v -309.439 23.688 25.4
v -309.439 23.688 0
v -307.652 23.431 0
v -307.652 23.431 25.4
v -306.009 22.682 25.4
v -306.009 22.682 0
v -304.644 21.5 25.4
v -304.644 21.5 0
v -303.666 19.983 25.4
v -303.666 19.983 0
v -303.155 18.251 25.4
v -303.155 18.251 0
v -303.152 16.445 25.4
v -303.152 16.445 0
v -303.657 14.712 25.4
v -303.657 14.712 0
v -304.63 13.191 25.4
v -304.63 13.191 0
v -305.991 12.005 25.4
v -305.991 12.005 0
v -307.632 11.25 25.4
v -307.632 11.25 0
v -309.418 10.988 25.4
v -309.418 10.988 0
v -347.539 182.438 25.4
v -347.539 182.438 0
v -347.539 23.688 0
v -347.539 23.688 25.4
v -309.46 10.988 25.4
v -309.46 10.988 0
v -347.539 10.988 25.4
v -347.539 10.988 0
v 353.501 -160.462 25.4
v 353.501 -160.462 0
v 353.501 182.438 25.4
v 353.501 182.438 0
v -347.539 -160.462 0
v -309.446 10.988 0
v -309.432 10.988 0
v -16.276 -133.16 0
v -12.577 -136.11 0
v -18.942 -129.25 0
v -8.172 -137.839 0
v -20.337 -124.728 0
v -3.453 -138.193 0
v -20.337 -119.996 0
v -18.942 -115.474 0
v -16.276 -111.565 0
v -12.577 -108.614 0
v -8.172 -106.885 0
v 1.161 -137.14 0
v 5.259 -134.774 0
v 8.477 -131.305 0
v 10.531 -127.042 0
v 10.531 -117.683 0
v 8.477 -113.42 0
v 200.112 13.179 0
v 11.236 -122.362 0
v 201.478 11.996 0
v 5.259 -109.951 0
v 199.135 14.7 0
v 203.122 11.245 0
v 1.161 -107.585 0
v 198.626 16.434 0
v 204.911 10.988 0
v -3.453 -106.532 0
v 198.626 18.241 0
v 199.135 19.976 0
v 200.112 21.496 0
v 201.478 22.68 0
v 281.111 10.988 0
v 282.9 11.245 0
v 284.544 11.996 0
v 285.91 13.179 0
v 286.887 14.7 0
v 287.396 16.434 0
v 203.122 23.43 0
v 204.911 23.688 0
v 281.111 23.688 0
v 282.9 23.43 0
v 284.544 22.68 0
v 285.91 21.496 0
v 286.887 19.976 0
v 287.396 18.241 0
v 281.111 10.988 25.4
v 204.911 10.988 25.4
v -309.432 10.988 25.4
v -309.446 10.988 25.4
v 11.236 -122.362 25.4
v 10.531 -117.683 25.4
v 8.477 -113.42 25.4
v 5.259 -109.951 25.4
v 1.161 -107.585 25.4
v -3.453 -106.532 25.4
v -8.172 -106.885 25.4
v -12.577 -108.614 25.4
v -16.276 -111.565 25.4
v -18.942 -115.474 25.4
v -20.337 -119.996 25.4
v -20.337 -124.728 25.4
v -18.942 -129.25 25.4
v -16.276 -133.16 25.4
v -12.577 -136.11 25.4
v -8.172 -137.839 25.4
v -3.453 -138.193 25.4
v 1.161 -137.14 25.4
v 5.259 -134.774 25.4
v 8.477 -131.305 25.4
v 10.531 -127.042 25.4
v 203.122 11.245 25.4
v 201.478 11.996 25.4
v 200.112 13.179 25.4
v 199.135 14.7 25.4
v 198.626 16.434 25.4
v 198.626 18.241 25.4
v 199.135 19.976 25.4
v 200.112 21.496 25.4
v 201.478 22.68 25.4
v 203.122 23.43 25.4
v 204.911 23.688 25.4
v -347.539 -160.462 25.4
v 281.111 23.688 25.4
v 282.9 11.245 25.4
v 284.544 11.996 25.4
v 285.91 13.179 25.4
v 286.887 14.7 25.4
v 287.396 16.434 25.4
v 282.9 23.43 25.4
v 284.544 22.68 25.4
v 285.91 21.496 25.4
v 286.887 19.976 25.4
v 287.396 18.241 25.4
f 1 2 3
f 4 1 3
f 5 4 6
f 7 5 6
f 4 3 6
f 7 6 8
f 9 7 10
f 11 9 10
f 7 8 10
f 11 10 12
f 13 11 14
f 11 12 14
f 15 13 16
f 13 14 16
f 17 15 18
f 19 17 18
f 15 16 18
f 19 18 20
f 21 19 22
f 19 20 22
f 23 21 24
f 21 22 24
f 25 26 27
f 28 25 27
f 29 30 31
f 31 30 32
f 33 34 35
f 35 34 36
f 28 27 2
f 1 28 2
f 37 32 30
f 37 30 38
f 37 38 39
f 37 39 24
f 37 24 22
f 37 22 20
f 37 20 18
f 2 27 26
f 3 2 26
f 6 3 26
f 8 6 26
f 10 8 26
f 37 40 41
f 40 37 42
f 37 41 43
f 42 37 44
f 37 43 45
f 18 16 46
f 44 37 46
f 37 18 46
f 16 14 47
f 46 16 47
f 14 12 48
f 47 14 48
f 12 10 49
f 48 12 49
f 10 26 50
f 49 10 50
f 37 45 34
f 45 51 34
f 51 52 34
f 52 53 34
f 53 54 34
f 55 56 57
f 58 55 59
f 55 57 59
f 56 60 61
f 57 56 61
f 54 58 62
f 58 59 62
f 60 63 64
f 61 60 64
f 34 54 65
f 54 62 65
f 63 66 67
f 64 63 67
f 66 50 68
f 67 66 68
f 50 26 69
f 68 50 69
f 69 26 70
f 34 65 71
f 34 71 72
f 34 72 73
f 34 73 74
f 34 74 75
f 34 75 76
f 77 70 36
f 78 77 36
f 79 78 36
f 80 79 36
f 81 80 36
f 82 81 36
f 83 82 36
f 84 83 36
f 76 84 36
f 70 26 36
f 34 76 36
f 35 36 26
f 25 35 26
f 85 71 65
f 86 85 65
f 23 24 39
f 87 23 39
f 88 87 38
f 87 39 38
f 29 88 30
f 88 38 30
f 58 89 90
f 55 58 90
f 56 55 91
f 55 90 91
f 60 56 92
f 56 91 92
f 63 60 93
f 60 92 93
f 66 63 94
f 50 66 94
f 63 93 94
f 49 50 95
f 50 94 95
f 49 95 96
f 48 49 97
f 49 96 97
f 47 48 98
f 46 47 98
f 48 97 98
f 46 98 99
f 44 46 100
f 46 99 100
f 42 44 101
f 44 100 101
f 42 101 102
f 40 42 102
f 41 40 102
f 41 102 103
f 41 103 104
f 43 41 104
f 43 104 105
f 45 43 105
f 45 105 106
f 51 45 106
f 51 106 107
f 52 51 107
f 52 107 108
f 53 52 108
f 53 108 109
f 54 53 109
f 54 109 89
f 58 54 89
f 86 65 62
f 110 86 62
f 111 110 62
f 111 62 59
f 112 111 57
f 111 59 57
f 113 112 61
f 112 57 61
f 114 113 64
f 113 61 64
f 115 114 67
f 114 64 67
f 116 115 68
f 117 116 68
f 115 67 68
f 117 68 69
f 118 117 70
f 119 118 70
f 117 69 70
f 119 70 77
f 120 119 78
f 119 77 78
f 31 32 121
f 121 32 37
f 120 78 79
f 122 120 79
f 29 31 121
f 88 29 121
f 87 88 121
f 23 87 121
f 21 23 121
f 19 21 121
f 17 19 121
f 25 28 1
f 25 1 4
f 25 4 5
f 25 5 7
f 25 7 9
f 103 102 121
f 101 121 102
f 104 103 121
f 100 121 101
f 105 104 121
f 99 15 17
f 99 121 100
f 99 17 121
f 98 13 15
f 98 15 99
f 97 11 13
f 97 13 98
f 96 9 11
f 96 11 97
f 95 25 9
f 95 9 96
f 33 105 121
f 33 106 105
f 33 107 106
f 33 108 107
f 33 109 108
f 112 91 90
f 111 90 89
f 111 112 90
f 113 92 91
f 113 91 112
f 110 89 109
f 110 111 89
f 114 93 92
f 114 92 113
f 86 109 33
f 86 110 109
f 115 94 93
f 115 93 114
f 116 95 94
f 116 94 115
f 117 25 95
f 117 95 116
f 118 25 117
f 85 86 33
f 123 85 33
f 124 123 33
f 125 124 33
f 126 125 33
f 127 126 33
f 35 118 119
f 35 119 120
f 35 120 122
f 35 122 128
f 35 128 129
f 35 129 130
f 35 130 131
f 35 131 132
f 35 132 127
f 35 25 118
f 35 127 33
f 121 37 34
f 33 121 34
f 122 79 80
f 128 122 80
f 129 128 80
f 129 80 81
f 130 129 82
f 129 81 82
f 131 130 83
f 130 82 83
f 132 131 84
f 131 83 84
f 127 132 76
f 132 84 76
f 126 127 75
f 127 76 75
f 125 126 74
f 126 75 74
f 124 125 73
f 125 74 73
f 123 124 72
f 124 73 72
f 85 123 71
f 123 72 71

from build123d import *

# Parameters (mm, degrees)
F1_DEPTH = 25.4
F2_R     = 15.875
F3_DEPTH = 25.401


with BuildPart() as f1:
    # F0 (on Top) → F1 (new body)
    with BuildSketch(Plane.XY):
        with BuildLine():
            Line((353.500903, 182.437663), (-347.539097, 182.437663))
            Line((-347.539097, 182.437663), (-347.539097, 23.687663))
            Line((-347.539097, 23.687663), (-309.439097, 23.687663))
            ThreePointArc((-309.439097, 23.687663), (-303.089106, 17.348244), (-309.417936, 10.987698))
            ThreePointArc((-309.417936, 10.987698), (-309.439097, 10.987663), (-309.460259, 10.987698))
            Line((-309.460259, 10.987698), (-347.539097, 10.987698))
            Line((-347.539097, 10.987698), (-347.539097, -160.462337))
            Line((-347.539097, -160.462337), (353.500903, -160.462337))
            Line((353.500903, -160.462337), (353.500903, 182.437663))
        make_face()
        with BuildLine():
            ThreePointArc((204.910903, 10.987663), (198.560903, 17.337663), (204.910903, 23.687663))
            Line((204.910903, 23.687663), (281.110903, 23.687663))
            ThreePointArc((281.110903, 23.687663), (287.460903, 17.337663), (281.110903, 10.987663))
            Line((281.110903, 10.987663), (204.910903, 10.987663))
        make_face(mode=Mode.SUBTRACT)
    extrude(amount=F1_DEPTH)

    # F2 (on face) → F3 (cut, through all)
    with BuildSketch(Plane.XY.offset(25.4)):
        with Locations((-4.639097, -122.362337)):
            Circle(F2_R)
    extrude(amount=-F3_DEPTH, mode=Mode.SUBTRACT)


solid = f1.part
